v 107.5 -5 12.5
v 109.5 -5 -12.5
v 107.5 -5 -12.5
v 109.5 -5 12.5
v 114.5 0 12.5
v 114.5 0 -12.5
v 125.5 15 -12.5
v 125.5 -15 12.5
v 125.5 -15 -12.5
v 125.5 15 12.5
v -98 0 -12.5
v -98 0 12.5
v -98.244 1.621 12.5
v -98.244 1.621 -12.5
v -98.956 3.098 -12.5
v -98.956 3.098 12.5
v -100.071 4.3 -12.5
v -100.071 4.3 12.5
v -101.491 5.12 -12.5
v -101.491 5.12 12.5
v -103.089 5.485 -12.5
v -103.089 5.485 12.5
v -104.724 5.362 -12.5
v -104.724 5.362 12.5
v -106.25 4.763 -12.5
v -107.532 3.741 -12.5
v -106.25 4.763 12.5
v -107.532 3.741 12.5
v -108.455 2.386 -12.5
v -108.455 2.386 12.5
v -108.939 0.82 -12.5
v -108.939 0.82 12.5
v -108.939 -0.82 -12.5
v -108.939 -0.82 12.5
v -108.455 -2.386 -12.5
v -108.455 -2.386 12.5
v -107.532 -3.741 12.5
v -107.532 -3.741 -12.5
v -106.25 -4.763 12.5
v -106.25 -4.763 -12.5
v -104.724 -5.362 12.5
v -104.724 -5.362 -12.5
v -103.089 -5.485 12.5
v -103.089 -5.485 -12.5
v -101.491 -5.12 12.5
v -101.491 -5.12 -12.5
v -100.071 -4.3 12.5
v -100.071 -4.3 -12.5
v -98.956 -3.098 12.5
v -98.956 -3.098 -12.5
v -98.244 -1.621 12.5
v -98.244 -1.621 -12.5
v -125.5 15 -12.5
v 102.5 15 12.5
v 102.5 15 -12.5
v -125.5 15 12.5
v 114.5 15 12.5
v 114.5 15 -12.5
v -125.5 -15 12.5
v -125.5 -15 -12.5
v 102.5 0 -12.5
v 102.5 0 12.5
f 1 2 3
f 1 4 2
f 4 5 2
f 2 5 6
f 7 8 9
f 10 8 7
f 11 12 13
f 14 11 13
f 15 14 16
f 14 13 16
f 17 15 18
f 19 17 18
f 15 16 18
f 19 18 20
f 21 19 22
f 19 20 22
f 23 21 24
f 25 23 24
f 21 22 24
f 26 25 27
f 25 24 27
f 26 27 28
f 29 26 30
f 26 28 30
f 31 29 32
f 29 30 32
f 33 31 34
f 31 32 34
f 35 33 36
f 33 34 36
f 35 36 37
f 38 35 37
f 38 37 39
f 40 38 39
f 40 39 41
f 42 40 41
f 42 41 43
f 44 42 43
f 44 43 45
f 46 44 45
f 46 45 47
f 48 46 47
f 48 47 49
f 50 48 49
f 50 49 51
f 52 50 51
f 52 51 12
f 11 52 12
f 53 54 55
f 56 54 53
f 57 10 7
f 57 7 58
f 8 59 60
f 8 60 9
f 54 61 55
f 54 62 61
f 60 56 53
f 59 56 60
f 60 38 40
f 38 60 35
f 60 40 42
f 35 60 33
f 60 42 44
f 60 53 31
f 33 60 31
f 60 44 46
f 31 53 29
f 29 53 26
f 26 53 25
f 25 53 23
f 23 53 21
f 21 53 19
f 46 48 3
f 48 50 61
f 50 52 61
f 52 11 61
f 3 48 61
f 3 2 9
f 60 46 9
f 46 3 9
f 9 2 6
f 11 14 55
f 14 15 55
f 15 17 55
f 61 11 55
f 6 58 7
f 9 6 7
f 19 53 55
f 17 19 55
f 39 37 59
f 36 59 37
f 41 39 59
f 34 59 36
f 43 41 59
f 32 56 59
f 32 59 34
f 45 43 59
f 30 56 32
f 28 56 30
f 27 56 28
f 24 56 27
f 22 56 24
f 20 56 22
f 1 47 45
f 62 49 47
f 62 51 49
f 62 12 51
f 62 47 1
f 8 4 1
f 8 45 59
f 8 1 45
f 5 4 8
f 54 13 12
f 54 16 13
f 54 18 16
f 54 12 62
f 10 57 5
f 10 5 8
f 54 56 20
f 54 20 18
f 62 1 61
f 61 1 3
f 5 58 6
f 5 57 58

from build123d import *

# Parameters (mm, degrees)
F1_DEPTH = 12.5
F2_R     = 5.5
F3_DEPTH = 25.001
F4_SIZE  = 5


with BuildPart() as f1:
    # F0 (on Top) → F1 (new body, symmetric)
    with BuildSketch(Plane.XY):
        Polygon((102.5, 15), (-125.5, 15), (-125.5, -15), (125.5, -15), (125.5, 15), (114.5, 15), (114.5, -5), (102.5, -5), align=None)
    extrude(amount=F1_DEPTH, both=True)

    # F2 (on face) → F3 (cut, through all)
    with BuildSketch(Plane.XY.offset(12.5)):
        with Locations((-103.5, 0)):
            Circle(F2_R)
    extrude(amount=-F3_DEPTH, mode=Mode.SUBTRACT)

    # F4
    f4_edges = [f1.edges().sort_by_distance(p)[0] for p in [
        (102.5, -5, 0),
        (114.5, -5, 0),
    ]]
    chamfer(f4_edges, length=F4_SIZE)


solid = f1.part
